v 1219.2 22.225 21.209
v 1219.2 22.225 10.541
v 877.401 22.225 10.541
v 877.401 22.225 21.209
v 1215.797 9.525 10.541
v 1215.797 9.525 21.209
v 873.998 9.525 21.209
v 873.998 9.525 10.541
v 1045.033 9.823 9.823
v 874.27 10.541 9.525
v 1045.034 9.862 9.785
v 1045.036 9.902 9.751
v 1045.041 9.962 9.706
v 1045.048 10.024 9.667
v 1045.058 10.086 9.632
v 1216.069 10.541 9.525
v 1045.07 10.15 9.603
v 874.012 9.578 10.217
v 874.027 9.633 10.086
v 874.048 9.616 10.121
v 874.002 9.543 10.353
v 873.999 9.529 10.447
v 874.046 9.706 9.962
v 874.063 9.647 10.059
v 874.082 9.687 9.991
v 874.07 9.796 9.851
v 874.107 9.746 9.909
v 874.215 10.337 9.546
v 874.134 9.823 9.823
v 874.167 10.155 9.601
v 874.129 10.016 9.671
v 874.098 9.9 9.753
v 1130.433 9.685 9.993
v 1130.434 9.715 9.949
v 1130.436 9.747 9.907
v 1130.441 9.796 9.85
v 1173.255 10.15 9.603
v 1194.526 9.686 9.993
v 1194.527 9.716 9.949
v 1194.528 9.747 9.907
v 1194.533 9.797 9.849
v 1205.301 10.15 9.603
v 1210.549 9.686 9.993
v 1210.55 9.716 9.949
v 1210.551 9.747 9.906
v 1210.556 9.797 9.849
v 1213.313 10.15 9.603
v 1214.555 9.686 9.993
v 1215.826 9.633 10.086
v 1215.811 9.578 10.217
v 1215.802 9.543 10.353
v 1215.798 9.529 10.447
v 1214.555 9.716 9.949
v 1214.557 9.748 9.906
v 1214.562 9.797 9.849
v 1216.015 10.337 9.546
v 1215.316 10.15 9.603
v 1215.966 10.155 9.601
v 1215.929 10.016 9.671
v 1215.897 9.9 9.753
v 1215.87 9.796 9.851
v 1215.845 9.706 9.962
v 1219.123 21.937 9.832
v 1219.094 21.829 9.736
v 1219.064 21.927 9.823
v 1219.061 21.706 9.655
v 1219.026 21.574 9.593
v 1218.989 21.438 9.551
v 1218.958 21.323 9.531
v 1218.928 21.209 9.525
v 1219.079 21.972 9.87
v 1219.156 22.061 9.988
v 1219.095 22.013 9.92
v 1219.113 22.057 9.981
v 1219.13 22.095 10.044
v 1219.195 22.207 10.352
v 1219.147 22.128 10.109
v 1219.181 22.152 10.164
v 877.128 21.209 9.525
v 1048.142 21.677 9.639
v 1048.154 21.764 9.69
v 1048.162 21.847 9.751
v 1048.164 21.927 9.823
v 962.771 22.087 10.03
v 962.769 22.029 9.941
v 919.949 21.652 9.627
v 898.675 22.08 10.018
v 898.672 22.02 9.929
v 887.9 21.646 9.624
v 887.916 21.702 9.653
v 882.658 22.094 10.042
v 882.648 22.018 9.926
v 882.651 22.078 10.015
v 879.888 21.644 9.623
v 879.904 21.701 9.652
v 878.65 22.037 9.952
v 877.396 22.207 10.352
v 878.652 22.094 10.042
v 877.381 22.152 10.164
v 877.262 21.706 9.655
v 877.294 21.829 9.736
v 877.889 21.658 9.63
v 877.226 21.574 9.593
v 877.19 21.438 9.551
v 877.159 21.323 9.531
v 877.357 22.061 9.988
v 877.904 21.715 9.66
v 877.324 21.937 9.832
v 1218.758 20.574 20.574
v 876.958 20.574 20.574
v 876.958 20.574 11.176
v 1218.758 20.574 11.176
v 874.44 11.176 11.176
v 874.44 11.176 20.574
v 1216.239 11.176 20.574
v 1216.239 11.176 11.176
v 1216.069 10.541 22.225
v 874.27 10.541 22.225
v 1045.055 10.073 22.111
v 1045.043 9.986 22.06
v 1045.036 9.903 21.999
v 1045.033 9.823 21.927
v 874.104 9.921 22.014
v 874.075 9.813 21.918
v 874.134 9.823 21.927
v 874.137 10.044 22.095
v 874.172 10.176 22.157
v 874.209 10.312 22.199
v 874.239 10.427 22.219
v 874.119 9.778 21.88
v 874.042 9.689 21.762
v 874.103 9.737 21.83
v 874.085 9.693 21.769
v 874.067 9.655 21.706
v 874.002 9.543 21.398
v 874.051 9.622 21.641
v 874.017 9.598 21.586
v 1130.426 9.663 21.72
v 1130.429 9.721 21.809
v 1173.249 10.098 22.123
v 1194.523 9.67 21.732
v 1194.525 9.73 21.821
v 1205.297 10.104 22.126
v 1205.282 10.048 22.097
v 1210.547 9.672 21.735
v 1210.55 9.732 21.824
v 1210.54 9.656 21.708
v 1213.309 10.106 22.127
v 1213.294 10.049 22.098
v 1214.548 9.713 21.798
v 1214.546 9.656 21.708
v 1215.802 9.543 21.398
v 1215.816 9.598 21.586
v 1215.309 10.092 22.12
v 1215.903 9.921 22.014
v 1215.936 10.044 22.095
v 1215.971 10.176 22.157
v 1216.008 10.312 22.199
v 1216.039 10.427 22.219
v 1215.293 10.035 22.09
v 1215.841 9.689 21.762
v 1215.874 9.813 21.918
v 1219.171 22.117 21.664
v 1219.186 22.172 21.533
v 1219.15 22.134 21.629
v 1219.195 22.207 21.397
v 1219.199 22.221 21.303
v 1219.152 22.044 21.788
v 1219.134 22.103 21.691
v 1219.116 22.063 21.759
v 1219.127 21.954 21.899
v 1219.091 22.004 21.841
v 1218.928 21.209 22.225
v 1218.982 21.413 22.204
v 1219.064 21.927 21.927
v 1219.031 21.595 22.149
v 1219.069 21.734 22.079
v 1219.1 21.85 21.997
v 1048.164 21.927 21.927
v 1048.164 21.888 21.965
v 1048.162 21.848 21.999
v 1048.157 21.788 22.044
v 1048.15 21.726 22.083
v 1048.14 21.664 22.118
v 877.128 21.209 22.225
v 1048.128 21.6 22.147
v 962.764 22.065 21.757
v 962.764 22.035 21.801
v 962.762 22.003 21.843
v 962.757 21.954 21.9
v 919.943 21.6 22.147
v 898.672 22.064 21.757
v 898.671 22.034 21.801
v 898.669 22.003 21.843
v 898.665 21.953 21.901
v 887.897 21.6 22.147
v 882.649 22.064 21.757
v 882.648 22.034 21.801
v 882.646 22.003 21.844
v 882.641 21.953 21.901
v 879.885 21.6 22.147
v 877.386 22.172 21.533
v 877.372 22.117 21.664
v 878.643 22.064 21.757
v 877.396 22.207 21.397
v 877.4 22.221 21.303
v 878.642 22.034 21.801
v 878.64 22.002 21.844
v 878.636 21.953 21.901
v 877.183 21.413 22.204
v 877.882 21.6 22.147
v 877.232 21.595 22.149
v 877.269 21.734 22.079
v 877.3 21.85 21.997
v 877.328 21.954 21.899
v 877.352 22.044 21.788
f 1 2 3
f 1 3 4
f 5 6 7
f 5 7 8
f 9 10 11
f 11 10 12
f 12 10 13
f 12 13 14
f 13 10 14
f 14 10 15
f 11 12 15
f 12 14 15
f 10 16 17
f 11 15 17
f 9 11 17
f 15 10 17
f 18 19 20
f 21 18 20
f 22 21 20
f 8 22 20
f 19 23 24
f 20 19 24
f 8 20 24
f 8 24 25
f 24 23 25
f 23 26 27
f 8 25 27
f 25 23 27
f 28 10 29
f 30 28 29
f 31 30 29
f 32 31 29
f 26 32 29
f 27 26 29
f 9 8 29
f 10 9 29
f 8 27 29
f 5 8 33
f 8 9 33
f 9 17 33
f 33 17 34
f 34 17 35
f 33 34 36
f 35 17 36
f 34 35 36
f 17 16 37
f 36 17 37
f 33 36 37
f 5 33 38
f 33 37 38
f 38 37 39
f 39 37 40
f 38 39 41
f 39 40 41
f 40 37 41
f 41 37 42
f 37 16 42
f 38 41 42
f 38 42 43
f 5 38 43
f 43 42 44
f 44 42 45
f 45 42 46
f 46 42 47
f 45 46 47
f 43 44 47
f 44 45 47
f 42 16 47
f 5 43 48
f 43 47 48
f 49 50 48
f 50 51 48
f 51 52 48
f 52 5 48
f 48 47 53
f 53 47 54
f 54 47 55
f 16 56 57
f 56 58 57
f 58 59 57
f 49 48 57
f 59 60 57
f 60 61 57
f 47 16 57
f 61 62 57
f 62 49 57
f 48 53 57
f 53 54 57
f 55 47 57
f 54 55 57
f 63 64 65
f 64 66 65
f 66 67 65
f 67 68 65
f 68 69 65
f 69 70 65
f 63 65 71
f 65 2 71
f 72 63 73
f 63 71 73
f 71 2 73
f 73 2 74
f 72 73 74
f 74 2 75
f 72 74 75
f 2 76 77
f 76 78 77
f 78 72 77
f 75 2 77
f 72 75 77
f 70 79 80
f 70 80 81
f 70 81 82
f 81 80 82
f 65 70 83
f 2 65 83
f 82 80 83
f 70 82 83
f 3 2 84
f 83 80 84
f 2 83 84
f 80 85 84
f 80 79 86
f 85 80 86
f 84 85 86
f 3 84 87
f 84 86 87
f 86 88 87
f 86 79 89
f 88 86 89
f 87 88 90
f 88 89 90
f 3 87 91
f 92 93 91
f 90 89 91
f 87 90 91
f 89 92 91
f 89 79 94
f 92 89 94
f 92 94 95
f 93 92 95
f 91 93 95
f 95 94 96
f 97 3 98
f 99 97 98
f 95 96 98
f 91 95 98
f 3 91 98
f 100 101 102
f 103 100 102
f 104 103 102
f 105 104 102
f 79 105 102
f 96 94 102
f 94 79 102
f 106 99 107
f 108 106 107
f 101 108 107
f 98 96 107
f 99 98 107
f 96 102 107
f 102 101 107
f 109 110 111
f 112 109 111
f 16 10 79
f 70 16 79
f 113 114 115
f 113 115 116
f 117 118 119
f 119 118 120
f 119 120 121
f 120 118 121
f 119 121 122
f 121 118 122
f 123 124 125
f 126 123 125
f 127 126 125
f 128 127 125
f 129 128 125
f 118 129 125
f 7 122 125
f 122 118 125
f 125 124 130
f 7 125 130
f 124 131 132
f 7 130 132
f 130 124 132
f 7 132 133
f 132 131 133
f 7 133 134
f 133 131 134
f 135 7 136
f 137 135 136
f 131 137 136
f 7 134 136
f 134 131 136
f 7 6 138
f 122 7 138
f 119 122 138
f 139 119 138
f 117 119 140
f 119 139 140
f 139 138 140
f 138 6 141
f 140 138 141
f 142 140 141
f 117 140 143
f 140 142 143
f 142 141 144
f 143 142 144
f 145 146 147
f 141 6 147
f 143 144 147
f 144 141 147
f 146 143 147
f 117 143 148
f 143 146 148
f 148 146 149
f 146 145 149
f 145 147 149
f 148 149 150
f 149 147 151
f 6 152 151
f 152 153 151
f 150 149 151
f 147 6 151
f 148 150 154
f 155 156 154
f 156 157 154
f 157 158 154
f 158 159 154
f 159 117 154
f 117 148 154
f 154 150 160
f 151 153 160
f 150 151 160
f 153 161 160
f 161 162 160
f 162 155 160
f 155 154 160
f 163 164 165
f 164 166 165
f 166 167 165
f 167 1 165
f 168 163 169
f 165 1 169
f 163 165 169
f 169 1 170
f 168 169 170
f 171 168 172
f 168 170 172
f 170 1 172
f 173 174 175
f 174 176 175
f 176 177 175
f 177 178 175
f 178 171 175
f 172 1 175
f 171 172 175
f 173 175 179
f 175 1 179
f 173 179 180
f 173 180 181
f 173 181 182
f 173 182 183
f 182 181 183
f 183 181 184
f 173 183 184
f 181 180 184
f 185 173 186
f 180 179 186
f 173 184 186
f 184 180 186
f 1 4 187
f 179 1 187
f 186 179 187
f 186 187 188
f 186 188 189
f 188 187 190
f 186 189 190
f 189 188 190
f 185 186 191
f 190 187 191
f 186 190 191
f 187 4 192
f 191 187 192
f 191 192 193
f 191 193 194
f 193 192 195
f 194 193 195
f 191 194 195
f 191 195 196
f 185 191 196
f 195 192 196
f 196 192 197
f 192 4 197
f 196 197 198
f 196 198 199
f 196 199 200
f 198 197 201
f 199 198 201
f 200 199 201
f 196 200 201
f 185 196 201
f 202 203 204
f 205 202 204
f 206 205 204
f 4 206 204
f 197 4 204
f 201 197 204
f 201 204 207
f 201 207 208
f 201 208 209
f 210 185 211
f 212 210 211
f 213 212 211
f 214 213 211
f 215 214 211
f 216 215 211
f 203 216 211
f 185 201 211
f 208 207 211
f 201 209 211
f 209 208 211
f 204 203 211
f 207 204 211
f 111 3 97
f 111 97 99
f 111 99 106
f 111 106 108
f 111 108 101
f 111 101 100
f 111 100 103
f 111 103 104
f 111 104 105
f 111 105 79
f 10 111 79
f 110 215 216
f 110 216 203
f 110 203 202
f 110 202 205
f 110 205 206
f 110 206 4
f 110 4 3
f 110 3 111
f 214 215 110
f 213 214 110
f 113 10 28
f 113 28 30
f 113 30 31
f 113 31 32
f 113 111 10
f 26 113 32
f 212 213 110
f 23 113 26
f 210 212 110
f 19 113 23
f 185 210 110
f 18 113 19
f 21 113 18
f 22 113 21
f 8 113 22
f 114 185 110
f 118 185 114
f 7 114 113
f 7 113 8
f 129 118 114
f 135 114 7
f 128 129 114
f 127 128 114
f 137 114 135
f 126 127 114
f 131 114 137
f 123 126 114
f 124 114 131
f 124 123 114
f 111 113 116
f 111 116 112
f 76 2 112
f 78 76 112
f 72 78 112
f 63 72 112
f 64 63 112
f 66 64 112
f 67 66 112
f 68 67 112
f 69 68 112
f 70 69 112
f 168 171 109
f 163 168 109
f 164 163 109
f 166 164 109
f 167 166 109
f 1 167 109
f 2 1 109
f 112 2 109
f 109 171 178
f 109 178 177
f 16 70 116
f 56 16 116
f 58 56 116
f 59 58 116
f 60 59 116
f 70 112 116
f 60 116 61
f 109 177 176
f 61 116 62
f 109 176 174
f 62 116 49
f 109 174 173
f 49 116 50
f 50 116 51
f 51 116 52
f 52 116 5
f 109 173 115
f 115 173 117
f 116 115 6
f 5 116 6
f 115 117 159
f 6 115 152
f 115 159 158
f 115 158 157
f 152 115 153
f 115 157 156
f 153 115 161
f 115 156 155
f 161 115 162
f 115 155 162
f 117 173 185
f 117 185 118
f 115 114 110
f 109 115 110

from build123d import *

# Parameters (mm, degrees)
SKETCH1_W           = 23.495
SKETCH1_H           = 23.495
BOSS_EXTRUDE1_DEPTH = 1320.8
SCALE2_SCALE_X      = 1
SCALE2_SCALE_Y      = 0.4
SCALE2_SCALE_Z      = 0.4
CUT_EXTRUDE1_DEPTH  = 1322.04802369
CUT_EXTRUDE2_DEPTH  = 1322.04802369


with BuildPart() as part:
    # Sketch1 → Boss-Extrude1 (new body)
    with BuildSketch(Plane(origin=(0, 0, 0), x_dir=(0, 0, -1), z_dir=(1, 0, 0))):
        with BuildLine():
            Line((0, 2.54), (0, 29.21))
            ThreePointArc((0, 29.21), (-0.743948776, 31.006051224), (-2.54, 31.75))
            Line((-2.54, 31.75), (-29.21, 31.75))
            ThreePointArc((-29.21, 31.75), (-31.006051224, 31.006051224), (-31.75, 29.21))
            Line((-31.75, 29.21), (-31.75, 2.54))
            ThreePointArc((-31.75, 2.54), (-31.006051224, 0.743948776), (-29.21, 0))
            Line((-29.21, 0), (-2.54, 0))
            ThreePointArc((-2.54, 0), (-0.743948776, 0.743948776), (0, 2.54))
        make_face()
        with Locations((-15.875, 15.875)):
            Rectangle(SKETCH1_W, SKETCH1_H, mode=Mode.SUBTRACT)
    extrude(amount=BOSS_EXTRUDE1_DEPTH)


with BuildPart() as part_1:
    # Scale2: scaled about (660.4, 15.875, 15.875)
    add(part.part.scale((SCALE2_SCALE_X, SCALE2_SCALE_Y, SCALE2_SCALE_Z), about=(660.4, 15.875, 15.875)))

    # Sketch3 → Cut-Extrude1 (cut, through all)
    with BuildSketch(Plane.XY.offset(22.225)):
        Polygon((877.40066618, 22.225), (873.997711436, 9.525), (851.266371854, 9.525), (851.266371854, 22.225), align=None)
    extrude(amount=-CUT_EXTRUDE1_DEPTH, mode=Mode.SUBTRACT)


with BuildPart() as cut_extrude1_kept_piece:
    # of the separate pieces the step leaves, the one the design keeps (cut_extrude1_pieces_kept)
    add(part_1.part.solids().sort_by_distance((877.128429801, 21.209, 9.525))[0])

    # Sketch4 → Cut-Extrude2 (cut, through all)
    with BuildSketch(Plane.XY.offset(22.225)):
        Polygon((1215.797045256, 9.525), (1320.8, 9.525), (1320.8, 22.225), (1219.2, 22.225), align=None)
    extrude(amount=-CUT_EXTRUDE2_DEPTH, mode=Mode.SUBTRACT)


solid = cut_extrude1_kept_piece.part
